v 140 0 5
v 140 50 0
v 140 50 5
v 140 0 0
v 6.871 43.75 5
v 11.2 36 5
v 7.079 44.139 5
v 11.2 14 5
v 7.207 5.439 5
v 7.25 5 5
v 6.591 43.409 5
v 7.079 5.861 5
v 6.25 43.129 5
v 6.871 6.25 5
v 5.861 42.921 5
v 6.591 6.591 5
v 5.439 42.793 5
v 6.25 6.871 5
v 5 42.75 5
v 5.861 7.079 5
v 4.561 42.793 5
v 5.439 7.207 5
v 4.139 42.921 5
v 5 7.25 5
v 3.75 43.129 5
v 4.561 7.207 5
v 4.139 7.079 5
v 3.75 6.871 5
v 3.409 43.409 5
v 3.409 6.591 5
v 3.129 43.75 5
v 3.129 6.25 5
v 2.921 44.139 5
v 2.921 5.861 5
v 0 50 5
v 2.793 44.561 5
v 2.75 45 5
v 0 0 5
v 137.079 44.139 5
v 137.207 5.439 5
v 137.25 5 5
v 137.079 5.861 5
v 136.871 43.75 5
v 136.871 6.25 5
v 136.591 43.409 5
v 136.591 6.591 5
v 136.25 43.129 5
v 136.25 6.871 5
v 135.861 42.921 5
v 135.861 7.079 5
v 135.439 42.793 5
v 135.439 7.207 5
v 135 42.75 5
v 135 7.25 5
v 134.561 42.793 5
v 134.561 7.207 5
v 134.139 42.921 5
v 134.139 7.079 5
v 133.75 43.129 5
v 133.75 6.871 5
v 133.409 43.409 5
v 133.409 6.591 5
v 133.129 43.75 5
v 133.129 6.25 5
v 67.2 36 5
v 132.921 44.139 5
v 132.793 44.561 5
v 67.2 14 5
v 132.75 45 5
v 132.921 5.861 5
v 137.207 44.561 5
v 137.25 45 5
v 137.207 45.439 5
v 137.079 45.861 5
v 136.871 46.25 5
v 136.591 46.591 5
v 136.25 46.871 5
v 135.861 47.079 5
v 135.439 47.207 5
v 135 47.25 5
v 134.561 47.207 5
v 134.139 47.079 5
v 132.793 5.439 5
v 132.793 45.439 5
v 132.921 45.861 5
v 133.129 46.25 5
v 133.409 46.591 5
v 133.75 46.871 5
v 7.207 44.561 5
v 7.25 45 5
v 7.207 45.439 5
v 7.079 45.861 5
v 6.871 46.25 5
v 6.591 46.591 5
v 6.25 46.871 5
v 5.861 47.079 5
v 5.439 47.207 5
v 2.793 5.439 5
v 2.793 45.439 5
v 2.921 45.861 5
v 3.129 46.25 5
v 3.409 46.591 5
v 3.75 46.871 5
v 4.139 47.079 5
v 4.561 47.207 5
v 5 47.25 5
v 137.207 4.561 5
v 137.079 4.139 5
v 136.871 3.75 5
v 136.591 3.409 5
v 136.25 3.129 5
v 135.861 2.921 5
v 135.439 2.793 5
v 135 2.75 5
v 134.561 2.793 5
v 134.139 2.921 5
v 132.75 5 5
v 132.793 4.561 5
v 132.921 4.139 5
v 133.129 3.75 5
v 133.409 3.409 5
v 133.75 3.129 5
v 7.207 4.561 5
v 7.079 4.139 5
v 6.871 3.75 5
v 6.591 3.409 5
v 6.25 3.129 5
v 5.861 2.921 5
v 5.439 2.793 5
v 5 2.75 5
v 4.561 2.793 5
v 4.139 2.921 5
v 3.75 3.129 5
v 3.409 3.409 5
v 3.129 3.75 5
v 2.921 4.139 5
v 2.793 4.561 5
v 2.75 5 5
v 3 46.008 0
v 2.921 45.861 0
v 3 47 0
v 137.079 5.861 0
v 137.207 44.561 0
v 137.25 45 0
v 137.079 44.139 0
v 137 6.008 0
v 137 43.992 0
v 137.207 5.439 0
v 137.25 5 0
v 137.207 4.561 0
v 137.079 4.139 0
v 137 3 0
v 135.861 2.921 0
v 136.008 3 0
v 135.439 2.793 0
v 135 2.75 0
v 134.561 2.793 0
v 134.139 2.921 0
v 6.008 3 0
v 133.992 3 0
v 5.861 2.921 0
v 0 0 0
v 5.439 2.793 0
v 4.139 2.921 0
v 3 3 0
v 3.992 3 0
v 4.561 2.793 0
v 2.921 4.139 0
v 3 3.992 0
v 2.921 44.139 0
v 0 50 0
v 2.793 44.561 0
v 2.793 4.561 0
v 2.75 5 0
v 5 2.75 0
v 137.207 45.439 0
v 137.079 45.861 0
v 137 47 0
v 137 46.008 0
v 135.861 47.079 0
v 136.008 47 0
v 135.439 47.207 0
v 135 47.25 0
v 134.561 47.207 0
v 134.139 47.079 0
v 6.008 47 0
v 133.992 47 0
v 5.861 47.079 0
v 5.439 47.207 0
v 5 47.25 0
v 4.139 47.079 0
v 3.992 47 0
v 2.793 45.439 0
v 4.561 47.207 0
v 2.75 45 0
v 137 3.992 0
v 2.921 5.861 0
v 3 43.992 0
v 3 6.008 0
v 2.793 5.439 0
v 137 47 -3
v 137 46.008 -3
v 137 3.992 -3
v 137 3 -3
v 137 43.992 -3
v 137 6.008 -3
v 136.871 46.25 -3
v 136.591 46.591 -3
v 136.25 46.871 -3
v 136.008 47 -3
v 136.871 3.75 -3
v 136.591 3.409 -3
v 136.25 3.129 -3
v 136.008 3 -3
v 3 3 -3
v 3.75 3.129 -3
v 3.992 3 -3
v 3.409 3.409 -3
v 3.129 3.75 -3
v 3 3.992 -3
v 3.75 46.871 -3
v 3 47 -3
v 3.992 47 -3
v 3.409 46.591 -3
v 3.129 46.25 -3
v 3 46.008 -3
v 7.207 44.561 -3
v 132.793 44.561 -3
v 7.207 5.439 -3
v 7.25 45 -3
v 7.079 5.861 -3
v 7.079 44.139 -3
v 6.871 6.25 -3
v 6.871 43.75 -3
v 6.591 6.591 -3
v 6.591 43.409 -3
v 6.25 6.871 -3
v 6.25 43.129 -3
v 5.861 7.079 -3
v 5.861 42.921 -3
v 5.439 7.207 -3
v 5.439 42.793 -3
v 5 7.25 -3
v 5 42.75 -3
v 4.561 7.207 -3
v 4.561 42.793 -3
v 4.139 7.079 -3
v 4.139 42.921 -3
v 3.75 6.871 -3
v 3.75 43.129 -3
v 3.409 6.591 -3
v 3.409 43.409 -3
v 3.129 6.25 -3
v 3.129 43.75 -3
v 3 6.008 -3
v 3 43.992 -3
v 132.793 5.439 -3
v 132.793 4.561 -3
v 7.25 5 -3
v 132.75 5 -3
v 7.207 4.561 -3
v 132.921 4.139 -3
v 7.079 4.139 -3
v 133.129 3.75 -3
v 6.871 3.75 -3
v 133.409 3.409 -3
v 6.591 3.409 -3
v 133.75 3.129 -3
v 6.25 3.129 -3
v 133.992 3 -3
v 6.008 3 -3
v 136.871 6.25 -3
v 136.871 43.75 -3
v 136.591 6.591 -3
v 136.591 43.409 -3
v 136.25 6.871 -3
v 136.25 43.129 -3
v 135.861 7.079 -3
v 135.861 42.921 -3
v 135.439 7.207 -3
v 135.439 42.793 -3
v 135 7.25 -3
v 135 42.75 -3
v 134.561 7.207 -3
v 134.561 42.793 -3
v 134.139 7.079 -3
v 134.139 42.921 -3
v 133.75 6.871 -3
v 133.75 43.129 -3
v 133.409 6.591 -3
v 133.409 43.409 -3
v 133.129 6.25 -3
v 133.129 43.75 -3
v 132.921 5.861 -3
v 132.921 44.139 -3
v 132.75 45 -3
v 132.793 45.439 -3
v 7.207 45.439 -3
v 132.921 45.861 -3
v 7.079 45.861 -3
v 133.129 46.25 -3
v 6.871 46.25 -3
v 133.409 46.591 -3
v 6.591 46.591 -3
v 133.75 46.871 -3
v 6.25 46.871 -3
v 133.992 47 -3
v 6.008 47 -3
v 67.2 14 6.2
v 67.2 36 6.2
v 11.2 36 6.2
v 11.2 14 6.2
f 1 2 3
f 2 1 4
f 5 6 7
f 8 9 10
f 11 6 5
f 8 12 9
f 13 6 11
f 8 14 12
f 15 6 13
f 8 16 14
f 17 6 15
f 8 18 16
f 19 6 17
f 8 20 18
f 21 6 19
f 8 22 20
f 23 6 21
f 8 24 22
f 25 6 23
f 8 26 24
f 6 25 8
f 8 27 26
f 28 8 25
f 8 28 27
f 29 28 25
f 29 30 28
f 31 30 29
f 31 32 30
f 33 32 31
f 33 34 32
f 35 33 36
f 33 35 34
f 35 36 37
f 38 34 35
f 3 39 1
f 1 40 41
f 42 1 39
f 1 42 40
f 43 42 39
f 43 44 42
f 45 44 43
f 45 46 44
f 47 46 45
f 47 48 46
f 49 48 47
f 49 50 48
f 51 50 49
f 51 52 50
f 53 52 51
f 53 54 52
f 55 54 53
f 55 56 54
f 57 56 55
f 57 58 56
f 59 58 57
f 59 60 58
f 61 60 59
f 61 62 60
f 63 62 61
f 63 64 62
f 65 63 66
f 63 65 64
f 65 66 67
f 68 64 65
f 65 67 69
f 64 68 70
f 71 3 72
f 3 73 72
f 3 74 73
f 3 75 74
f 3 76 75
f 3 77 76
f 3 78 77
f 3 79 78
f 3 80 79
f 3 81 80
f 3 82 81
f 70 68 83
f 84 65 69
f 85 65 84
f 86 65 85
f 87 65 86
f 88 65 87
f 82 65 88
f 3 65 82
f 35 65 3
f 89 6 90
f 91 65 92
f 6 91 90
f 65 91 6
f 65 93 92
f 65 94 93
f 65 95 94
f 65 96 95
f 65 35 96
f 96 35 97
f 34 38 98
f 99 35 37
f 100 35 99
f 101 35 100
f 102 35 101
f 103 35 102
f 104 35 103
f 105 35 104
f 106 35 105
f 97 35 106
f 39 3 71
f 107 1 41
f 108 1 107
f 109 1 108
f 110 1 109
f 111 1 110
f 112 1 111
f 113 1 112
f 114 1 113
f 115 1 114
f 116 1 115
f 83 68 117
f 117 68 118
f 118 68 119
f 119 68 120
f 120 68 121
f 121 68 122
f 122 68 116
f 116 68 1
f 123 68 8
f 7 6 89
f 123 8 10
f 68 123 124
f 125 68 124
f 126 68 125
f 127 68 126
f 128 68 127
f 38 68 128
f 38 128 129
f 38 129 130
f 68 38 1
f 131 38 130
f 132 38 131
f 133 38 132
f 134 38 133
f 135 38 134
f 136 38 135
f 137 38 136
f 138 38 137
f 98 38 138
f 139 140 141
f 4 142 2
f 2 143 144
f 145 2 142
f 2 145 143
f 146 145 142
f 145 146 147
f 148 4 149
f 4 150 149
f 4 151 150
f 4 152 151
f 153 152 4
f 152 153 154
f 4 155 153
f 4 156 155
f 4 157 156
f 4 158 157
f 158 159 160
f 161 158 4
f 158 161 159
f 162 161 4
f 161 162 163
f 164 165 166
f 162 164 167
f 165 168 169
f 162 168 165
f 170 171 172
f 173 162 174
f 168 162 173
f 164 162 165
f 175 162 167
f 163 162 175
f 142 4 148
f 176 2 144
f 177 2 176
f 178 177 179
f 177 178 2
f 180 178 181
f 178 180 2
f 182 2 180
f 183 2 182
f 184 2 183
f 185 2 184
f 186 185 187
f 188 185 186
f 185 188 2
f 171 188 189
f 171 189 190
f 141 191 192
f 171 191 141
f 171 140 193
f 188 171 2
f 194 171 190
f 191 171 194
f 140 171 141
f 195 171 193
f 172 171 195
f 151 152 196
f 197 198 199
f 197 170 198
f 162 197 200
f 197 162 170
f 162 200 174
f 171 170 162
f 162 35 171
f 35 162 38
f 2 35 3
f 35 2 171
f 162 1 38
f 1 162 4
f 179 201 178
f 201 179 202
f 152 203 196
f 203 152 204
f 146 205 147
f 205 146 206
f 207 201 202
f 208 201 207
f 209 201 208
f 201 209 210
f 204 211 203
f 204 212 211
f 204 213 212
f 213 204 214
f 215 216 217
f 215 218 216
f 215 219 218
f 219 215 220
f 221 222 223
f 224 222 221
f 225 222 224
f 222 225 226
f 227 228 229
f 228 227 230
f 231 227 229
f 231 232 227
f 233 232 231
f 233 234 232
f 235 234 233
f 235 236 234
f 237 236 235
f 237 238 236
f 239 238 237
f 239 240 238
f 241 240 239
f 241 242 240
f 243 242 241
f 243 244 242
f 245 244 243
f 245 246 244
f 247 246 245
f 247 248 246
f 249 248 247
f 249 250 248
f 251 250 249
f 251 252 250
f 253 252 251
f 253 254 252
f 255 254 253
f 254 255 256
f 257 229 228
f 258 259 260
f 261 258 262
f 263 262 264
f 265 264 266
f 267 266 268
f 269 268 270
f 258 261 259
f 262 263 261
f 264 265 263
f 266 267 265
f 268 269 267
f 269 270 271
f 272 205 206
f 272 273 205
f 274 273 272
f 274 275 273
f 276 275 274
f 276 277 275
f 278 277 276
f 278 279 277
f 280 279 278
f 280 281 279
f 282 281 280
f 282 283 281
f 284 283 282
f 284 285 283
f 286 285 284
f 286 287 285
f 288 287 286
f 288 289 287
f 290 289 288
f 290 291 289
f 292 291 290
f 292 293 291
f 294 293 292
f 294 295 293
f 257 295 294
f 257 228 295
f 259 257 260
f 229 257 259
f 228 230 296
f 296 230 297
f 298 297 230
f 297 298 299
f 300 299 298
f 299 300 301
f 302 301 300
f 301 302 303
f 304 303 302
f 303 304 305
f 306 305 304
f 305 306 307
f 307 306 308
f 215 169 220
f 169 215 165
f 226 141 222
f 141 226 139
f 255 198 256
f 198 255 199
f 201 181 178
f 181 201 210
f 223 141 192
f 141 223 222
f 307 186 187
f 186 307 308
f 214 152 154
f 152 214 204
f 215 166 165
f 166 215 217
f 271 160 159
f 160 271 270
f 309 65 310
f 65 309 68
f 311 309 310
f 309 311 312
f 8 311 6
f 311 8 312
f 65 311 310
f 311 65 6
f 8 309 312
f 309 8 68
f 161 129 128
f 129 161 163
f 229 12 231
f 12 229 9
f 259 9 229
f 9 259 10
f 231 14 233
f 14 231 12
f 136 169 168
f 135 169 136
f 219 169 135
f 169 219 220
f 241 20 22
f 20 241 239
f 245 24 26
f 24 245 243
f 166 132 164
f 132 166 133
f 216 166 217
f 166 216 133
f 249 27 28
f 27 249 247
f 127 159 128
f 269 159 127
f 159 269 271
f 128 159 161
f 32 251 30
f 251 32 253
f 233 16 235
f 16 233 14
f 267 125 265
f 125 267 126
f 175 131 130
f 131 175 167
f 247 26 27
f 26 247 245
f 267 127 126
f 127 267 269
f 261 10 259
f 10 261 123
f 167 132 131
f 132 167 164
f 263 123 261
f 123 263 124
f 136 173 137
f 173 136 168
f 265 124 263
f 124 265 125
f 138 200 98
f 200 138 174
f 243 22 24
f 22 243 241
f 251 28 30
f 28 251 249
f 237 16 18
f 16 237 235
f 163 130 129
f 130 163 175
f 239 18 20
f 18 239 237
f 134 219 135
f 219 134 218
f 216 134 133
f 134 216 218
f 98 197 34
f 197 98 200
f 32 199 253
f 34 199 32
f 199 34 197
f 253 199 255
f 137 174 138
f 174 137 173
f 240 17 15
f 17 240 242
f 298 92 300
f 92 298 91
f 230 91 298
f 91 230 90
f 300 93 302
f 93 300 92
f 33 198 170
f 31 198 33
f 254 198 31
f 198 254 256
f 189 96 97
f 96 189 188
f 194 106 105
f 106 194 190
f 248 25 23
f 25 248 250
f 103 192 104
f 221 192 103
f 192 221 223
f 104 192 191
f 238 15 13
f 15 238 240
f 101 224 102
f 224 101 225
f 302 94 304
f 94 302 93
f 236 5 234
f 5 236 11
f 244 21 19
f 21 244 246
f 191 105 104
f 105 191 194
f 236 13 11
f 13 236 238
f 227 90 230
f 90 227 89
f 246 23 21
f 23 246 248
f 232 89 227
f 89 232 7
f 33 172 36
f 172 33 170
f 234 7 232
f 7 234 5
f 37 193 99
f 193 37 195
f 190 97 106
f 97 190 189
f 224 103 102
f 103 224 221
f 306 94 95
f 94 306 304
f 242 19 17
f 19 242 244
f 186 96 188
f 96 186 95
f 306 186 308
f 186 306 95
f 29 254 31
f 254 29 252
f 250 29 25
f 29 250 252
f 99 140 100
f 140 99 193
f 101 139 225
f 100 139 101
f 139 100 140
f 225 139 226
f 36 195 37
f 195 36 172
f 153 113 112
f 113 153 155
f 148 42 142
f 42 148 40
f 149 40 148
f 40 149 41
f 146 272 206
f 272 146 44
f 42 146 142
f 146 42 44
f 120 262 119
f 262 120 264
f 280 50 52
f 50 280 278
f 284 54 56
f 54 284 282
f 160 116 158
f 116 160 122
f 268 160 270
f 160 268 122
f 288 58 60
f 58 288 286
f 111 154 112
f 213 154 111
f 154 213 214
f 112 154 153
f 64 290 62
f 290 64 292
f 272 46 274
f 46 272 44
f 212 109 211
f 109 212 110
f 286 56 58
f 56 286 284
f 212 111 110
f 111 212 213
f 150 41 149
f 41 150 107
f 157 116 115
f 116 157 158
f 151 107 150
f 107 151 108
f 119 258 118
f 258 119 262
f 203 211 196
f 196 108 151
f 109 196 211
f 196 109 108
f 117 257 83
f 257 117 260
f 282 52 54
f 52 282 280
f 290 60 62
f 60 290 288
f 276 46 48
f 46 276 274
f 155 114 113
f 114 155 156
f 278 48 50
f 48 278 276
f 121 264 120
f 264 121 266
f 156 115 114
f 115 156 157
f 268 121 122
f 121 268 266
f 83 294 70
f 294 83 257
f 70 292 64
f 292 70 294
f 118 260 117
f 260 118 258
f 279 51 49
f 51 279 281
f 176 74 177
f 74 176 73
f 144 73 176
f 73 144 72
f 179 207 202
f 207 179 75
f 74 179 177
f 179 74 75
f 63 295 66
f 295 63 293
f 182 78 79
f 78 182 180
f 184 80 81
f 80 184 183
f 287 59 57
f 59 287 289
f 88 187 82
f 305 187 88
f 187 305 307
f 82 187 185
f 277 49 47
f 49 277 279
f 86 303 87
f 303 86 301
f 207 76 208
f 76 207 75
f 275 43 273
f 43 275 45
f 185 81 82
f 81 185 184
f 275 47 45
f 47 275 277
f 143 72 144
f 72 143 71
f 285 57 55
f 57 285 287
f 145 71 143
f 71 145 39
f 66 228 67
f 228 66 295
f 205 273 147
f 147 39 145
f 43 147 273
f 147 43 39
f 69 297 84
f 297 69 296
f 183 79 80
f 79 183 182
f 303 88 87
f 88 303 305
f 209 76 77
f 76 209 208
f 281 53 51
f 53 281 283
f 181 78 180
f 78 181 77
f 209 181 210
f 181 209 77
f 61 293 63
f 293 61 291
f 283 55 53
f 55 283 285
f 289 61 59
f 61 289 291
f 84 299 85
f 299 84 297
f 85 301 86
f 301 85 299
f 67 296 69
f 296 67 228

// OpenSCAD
$fn = 32;

// ----------------------------------------------------------------------
// Enclosure lid: 140 x 50 x 5 mm, 4 bolt holes
// ----------------------------------------------------------------------

// --- parameters (mm) ---
length = 140;             // lid length, X
width = 50;               // lid width, Y
plate_t = 5;              // lid plate thickness
bolt_d = 4.5;             // bolt clearance
boss_lip = 5;             // bolt hole inset from the corner
sink = 1;                 // overlap of the lip and ribs into the plate
lip_h = 4;                // lip height below the plate
lip_wall = 3;             // lip wall thickness
label_h = 1.2;            // raised marking pad

module plate() {
  cube([length, width, plate_t]);
  /* lip that drops into the housing opening, sunk into the plate */
  translate([lip_wall, lip_wall, -lip_h + sink]) cube([length - 2 * lip_wall, width - 2 * lip_wall, lip_h]);
  /* raised marking pad on top, sunk 1 mm into the plate */
  translate([length * 0.08, width * 0.28, plate_t - 1]) cube([length * 0.4, width * 0.44, label_h + 1]);
}

difference() {
  plate();
  /* bolt pattern matching the corner bosses */
  for (sx = [0, 1]) for (sy = [0, 1])
    translate([sx * (length - 2 * boss_lip) + boss_lip, sy * (width - 2 * boss_lip) + boss_lip, -lip_h - 1])
      cylinder(h = plate_t + lip_h + 2, d = bolt_d);
}
